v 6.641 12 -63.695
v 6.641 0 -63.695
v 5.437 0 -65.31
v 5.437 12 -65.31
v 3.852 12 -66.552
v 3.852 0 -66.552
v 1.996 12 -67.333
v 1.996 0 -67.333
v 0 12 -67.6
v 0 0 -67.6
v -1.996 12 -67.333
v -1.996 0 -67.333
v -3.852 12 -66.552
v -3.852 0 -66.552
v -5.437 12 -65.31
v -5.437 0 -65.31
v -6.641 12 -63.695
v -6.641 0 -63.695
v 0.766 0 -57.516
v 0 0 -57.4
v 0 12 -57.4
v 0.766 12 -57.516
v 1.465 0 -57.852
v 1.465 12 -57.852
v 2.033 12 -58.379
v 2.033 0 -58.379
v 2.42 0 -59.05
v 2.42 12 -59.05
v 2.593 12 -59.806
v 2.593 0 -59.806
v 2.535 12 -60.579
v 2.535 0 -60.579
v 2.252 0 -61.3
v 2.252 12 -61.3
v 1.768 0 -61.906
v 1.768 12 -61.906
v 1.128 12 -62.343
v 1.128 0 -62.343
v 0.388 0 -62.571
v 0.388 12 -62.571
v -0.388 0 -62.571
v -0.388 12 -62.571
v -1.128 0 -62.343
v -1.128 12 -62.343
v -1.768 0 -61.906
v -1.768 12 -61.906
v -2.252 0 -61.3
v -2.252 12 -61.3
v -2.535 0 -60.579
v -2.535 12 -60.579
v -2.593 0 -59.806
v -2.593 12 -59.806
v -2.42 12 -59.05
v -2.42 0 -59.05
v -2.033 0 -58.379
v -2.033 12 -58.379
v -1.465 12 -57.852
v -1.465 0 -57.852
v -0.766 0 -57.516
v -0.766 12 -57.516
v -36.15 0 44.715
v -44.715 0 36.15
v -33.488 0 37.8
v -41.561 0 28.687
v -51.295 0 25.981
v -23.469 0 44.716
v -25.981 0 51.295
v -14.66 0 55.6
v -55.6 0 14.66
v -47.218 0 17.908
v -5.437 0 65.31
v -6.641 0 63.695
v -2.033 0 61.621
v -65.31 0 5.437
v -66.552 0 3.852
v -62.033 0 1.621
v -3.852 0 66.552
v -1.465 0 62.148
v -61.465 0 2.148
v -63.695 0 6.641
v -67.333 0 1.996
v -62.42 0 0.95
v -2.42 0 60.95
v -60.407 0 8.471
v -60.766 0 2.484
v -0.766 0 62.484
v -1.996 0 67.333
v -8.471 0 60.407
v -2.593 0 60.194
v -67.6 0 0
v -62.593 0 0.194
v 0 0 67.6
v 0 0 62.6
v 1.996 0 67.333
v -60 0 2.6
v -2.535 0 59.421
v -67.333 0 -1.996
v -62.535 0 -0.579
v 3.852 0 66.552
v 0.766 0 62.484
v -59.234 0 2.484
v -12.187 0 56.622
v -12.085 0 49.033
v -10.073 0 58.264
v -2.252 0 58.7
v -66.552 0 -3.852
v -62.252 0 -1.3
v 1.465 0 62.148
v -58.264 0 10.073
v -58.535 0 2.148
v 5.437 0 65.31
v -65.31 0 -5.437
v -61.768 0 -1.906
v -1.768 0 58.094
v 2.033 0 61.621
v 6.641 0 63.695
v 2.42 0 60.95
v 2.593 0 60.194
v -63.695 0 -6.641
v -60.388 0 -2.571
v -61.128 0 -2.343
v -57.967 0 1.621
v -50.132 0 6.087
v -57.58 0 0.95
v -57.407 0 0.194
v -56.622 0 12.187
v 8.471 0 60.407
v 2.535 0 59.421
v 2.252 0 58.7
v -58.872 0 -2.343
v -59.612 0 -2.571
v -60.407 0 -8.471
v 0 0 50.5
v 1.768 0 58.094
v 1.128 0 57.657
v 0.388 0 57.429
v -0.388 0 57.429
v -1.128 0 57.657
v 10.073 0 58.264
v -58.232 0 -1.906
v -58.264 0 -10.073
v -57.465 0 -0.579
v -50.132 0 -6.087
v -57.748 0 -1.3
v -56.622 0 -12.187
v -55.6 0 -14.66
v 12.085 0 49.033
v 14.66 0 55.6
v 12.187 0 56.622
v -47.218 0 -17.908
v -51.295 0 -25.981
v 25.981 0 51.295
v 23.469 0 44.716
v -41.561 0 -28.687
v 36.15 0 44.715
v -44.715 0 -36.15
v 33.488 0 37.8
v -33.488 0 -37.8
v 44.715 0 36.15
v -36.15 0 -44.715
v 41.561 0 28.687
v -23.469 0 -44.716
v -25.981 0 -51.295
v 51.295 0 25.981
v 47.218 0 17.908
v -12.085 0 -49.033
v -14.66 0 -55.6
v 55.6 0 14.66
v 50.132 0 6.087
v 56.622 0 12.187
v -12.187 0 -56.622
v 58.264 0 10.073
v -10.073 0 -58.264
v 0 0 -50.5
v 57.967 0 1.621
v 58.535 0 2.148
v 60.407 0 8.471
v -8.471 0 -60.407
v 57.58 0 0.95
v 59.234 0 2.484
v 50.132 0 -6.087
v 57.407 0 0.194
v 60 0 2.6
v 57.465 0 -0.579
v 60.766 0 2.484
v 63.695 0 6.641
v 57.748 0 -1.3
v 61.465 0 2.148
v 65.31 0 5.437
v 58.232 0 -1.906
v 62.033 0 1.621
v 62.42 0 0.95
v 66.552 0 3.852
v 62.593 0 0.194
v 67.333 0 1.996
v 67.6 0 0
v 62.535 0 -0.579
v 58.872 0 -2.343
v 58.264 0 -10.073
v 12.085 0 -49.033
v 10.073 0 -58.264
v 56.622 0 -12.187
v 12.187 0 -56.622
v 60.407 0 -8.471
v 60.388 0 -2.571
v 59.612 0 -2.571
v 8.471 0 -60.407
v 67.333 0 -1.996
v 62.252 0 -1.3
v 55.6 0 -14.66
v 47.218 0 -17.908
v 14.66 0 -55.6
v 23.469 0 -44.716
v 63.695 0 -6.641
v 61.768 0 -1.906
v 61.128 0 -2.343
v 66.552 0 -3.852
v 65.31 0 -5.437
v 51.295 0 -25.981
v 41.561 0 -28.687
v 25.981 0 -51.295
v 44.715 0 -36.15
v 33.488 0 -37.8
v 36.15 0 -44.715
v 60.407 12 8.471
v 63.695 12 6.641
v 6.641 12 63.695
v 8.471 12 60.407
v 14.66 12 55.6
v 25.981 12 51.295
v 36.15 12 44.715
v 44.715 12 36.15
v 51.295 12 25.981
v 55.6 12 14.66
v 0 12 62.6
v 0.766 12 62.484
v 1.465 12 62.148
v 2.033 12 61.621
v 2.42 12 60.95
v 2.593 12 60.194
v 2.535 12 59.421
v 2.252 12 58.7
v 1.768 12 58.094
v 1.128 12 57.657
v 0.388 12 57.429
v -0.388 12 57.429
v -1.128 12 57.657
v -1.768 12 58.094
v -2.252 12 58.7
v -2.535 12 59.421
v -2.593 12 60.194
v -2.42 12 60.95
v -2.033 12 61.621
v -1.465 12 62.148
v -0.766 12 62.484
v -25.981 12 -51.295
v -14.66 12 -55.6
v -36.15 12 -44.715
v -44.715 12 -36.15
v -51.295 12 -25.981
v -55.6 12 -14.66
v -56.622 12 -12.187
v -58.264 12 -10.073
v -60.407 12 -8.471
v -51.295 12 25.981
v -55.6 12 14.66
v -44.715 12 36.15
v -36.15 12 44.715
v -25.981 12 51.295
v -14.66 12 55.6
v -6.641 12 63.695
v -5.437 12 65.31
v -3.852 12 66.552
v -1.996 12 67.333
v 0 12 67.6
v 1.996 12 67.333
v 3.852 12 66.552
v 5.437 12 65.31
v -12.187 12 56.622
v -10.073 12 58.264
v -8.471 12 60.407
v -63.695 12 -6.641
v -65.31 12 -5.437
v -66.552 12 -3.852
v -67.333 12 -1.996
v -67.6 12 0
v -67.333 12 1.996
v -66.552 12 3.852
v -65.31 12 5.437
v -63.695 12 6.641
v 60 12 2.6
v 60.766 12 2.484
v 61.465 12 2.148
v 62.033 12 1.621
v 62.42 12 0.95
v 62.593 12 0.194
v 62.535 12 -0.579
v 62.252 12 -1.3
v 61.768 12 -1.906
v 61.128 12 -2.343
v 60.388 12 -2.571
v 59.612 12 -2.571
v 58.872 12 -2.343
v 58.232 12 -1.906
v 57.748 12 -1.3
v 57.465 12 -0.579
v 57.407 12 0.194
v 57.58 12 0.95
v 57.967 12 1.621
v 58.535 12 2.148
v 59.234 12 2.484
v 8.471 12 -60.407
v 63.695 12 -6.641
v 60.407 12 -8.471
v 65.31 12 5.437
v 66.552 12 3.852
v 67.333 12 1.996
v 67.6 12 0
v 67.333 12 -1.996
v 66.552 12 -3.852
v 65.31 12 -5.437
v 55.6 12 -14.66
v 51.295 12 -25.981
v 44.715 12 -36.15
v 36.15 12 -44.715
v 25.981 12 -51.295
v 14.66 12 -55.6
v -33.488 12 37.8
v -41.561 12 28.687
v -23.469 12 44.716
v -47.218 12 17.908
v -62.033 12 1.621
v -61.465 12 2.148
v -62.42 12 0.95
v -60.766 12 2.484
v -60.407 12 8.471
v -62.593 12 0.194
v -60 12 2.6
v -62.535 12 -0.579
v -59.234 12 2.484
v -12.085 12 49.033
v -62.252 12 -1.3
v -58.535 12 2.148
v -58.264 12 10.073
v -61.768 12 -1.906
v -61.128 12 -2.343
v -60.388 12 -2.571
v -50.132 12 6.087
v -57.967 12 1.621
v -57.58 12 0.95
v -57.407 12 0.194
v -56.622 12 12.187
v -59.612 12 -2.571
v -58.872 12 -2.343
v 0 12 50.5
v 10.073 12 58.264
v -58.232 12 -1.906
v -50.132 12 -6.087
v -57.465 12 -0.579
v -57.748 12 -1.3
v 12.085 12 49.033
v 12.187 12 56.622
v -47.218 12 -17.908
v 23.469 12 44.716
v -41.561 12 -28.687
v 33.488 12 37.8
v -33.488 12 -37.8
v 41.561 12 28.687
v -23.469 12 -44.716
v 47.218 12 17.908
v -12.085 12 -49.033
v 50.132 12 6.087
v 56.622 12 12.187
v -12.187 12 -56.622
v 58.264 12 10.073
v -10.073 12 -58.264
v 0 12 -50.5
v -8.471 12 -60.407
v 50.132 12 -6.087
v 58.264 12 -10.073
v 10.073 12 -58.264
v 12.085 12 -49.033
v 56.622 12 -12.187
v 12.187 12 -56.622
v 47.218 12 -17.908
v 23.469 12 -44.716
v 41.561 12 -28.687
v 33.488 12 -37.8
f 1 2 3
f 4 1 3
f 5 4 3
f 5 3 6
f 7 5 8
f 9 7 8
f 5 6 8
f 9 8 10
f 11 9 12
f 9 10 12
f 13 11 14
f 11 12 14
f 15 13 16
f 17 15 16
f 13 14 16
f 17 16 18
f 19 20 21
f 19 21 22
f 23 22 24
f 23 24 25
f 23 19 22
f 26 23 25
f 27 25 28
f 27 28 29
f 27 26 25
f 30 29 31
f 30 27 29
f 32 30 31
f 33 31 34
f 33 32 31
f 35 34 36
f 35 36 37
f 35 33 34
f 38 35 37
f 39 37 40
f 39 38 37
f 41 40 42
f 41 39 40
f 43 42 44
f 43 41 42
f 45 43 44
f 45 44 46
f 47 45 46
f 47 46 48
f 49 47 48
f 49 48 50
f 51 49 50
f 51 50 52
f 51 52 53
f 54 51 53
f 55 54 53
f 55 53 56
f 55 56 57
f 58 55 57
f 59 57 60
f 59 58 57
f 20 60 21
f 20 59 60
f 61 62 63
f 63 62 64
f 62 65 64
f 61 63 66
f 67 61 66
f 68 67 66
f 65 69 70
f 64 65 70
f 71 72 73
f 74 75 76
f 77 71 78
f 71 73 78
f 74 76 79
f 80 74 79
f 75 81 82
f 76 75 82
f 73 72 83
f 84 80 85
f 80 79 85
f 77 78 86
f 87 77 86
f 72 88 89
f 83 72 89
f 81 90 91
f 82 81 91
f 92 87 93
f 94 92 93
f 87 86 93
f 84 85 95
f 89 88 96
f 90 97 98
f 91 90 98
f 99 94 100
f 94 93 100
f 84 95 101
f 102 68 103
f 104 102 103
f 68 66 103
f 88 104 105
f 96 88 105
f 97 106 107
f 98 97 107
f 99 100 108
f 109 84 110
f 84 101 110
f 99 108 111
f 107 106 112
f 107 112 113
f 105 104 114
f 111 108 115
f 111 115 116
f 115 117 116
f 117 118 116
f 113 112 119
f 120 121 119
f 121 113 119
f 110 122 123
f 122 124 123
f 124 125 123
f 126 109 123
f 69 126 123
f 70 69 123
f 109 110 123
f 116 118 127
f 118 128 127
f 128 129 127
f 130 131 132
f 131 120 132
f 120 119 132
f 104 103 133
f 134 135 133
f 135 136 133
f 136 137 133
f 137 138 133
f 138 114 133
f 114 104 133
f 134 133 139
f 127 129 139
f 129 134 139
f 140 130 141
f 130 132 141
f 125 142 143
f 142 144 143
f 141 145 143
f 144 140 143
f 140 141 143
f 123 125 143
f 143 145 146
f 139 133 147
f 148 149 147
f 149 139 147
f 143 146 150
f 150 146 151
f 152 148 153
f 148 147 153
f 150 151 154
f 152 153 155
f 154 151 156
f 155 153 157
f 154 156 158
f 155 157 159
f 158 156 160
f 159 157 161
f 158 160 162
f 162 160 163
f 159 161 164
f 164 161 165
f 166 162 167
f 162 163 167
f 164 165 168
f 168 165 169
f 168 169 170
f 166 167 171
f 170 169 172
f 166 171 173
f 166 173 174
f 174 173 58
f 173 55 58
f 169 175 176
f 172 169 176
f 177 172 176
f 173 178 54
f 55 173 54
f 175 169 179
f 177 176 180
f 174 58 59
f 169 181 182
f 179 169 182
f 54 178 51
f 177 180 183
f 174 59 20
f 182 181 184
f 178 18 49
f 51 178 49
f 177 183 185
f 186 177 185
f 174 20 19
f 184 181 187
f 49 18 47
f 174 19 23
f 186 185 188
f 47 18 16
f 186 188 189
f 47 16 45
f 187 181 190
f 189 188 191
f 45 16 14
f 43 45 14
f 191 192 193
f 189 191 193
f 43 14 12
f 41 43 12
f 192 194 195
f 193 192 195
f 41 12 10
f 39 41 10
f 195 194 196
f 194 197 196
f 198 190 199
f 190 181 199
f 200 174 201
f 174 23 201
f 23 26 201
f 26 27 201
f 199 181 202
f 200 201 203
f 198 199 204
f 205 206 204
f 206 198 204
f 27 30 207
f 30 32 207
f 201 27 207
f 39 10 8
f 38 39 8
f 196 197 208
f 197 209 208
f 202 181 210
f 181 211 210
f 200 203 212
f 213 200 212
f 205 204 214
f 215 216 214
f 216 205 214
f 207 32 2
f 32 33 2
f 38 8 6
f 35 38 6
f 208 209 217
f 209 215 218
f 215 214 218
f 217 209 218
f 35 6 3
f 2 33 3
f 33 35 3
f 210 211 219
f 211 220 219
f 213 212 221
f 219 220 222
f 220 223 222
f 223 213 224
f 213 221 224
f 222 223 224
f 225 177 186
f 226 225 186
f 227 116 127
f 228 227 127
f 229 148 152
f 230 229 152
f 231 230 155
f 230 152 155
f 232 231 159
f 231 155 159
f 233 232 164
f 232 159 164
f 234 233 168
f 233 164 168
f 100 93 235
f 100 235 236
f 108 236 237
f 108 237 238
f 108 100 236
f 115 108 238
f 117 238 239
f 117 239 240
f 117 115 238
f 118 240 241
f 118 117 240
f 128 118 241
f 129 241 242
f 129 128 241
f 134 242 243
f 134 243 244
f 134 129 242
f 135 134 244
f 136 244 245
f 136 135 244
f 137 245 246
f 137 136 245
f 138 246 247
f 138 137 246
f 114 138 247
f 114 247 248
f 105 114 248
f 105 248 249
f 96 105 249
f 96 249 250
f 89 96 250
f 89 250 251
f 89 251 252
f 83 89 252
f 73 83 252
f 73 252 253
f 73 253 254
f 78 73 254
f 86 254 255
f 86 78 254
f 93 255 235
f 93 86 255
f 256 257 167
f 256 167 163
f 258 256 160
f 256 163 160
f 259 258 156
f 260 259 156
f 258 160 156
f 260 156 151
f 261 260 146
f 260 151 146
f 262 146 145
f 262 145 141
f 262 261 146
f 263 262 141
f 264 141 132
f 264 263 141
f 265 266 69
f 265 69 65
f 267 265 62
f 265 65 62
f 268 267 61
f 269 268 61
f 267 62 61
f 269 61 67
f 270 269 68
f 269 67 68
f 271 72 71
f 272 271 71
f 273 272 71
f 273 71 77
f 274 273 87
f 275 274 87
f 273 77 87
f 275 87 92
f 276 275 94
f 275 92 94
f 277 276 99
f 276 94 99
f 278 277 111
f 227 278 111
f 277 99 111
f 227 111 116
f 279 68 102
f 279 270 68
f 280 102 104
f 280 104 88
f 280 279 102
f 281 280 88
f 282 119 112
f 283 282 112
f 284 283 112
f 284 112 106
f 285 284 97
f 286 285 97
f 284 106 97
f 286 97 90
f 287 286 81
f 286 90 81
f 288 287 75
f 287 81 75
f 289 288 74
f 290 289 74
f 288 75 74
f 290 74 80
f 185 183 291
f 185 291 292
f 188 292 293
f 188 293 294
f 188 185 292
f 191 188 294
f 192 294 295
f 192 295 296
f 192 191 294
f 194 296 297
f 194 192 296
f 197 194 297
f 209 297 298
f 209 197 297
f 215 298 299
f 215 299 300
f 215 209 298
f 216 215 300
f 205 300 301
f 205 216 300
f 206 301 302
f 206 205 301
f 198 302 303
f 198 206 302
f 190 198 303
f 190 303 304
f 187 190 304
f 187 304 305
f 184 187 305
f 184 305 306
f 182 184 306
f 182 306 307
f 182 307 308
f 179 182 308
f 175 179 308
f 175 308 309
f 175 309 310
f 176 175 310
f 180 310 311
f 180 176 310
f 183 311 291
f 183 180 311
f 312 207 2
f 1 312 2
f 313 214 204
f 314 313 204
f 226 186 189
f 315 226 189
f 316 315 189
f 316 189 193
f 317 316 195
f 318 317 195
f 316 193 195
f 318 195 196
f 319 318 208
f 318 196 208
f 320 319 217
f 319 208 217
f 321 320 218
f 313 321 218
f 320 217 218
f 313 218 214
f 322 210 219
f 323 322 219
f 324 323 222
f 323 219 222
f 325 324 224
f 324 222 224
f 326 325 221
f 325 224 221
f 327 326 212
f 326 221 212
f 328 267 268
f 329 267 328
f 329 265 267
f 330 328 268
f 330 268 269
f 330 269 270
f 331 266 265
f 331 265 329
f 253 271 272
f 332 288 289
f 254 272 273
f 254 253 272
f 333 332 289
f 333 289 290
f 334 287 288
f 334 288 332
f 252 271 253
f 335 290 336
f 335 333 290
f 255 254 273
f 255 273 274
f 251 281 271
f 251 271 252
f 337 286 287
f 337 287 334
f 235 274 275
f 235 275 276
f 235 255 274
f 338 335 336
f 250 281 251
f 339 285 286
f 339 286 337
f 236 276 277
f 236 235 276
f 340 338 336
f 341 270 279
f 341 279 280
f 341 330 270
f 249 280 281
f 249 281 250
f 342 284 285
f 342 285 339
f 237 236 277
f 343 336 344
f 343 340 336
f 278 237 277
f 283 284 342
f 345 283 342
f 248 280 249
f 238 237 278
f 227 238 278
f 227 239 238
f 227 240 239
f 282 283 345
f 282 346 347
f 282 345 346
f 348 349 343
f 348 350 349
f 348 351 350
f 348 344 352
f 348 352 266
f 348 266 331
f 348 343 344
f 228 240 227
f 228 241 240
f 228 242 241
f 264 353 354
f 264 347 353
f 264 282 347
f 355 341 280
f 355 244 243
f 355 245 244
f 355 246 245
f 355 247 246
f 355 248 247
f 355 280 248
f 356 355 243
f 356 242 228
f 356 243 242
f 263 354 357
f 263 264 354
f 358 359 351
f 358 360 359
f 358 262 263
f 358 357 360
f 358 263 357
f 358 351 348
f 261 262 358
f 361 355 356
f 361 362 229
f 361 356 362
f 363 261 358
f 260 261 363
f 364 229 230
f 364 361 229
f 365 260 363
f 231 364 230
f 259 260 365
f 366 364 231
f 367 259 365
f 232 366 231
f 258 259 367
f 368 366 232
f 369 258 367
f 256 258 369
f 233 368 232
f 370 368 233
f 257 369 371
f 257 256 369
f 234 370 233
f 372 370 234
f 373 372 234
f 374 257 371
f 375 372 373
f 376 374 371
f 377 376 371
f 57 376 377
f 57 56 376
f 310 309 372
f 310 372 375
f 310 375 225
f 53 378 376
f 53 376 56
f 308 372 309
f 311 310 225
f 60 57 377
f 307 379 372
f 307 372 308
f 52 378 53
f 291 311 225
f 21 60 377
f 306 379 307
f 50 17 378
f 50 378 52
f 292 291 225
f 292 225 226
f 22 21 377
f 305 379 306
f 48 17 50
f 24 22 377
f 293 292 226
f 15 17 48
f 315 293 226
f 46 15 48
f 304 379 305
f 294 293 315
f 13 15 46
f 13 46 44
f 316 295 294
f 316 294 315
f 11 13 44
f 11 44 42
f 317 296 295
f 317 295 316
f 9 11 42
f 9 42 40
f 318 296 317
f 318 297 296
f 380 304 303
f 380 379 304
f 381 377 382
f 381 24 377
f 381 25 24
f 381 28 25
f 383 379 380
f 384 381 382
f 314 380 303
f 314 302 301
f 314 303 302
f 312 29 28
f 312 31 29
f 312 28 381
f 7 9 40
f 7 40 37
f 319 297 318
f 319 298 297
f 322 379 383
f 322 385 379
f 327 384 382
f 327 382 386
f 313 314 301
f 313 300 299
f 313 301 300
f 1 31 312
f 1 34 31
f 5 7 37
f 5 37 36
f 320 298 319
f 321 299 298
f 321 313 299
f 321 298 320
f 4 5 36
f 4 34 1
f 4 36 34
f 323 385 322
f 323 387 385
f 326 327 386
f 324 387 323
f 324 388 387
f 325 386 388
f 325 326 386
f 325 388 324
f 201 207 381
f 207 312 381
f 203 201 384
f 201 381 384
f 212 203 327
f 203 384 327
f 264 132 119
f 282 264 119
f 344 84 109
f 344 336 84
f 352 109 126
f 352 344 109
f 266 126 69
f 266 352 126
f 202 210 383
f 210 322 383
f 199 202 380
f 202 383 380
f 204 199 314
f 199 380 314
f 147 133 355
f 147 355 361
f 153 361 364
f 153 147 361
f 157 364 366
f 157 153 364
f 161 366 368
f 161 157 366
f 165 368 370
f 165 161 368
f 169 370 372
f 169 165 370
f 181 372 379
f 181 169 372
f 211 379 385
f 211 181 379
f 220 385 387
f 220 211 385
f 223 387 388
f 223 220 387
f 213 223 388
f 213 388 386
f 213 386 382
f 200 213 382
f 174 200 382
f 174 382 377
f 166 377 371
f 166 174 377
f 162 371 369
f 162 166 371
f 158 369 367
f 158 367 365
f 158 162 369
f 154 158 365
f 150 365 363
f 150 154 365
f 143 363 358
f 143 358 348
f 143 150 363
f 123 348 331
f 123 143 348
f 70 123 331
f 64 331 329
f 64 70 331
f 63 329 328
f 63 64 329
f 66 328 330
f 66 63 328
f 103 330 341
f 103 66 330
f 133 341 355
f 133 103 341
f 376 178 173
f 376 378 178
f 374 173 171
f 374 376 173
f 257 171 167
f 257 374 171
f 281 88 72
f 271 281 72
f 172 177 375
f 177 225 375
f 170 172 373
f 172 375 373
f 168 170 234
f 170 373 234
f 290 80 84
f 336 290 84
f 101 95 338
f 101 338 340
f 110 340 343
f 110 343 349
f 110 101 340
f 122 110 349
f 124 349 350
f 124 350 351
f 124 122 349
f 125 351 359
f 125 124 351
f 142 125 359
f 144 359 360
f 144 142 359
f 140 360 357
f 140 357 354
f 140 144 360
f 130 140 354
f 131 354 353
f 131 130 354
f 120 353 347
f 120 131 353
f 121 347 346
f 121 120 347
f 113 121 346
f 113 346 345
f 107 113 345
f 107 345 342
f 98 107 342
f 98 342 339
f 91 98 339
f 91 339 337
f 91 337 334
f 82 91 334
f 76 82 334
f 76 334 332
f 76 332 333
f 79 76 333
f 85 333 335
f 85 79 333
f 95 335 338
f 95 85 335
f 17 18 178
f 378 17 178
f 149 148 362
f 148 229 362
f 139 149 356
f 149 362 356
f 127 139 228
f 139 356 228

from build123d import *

# Parameters (mm, degrees)
SKETCH_1_R      = 50.5
SKETCH_1_R_2    = 2.6
EXTRUDE_1_DEPTH = 12
FILLET_1_R      = 10


with BuildPart() as part:
    # ｽｹｯﾁ1 → ﾎﾞｽ - 押し出し1 (new body)
    with BuildSketch(Plane(origin=(0, 0, 0), x_dir=(1, 0, 0), z_dir=(0, 1, 0))):
        with BuildLine():
            Line((-6.641105235, 63.695364835), (-10.641105235, 56.506786136))
            ThreePointArc((-10.641105235, 56.506786136), (-40.658639918, 40.658639918), (-56.506786136, 10.641105235))
            Line((-56.506786136, 10.641105235), (-63.695364835, 6.641105235))
            ThreePointArc((-63.695364835, 6.641105235), (-67.6, 0), (-63.695364835, -6.641105235))
            Line((-63.695364835, -6.641105235), (-56.506786136, -10.641105235))
            ThreePointArc((-56.506786136, -10.641105235), (-40.658639918, -40.658639918), (-10.641105235, -56.506786136))
            Line((-10.641105235, -56.506786136), (-6.641105235, -63.695364835))
            ThreePointArc((-6.641105235, -63.695364835), (0, -67.6), (6.641105235, -63.695364835))
            Line((6.641105235, -63.695364835), (10.641105235, -56.506786136))
            ThreePointArc((10.641105235, -56.506786136), (40.658639918, -40.658639918), (56.506786136, -10.641105235))
            Line((56.506786136, -10.641105235), (63.695364835, -6.641105235))
            ThreePointArc((63.695364835, -6.641105235), (67.6, 0), (63.695364835, 6.641105235))
            Line((63.695364835, 6.641105235), (56.506786136, 10.641105235))
            ThreePointArc((56.506786136, 10.641105235), (40.658639918, 40.658639918), (10.641105235, 56.506786136))
            Line((10.641105235, 56.506786136), (6.641105235, 63.695364835))
            ThreePointArc((6.641105235, 63.695364835), (0, 67.6), (-6.641105235, 63.695364835))
        make_face()
        with Locations(Location((0, 0, 0), (0, 0, 270))):
            Circle(SKETCH_1_R, mode=Mode.SUBTRACT)
        with Locations(Location((0, 60, 0), (0, 0, 270))):
            Circle(SKETCH_1_R_2, mode=Mode.SUBTRACT)
        with Locations(Location((60, 0, 0), (0, 0, 270))):
            Circle(SKETCH_1_R_2, mode=Mode.SUBTRACT)
        with Locations(Location((0, -60, 0), (0, 0, 270))):
            Circle(SKETCH_1_R_2, mode=Mode.SUBTRACT)
        with Locations(Location((-60, 0, 0), (0, 0, 270))):
            Circle(SKETCH_1_R_2, mode=Mode.SUBTRACT)
    extrude(amount=EXTRUDE_1_DEPTH)

    # ﾌｨﾚｯﾄ1
    fillet_1_edges = [part.edges().sort_by_distance(p)[0] for p in [
        (10.641105235, 6, -56.506786136),
        (56.506786136, 6, -10.641105235),
        (56.506786136, 6, 10.641105235),
        (10.641105235, 6, 56.506786136),
        (-10.641105235, 6, 56.506786136),
        (-56.506786136, 6, 10.641105235),
        (-56.506786136, 6, -10.641105235),
        (-10.641105235, 6, -56.506786136),
    ]]
    fillet(fillet_1_edges, radius=FILLET_1_R)


solid = part.part
